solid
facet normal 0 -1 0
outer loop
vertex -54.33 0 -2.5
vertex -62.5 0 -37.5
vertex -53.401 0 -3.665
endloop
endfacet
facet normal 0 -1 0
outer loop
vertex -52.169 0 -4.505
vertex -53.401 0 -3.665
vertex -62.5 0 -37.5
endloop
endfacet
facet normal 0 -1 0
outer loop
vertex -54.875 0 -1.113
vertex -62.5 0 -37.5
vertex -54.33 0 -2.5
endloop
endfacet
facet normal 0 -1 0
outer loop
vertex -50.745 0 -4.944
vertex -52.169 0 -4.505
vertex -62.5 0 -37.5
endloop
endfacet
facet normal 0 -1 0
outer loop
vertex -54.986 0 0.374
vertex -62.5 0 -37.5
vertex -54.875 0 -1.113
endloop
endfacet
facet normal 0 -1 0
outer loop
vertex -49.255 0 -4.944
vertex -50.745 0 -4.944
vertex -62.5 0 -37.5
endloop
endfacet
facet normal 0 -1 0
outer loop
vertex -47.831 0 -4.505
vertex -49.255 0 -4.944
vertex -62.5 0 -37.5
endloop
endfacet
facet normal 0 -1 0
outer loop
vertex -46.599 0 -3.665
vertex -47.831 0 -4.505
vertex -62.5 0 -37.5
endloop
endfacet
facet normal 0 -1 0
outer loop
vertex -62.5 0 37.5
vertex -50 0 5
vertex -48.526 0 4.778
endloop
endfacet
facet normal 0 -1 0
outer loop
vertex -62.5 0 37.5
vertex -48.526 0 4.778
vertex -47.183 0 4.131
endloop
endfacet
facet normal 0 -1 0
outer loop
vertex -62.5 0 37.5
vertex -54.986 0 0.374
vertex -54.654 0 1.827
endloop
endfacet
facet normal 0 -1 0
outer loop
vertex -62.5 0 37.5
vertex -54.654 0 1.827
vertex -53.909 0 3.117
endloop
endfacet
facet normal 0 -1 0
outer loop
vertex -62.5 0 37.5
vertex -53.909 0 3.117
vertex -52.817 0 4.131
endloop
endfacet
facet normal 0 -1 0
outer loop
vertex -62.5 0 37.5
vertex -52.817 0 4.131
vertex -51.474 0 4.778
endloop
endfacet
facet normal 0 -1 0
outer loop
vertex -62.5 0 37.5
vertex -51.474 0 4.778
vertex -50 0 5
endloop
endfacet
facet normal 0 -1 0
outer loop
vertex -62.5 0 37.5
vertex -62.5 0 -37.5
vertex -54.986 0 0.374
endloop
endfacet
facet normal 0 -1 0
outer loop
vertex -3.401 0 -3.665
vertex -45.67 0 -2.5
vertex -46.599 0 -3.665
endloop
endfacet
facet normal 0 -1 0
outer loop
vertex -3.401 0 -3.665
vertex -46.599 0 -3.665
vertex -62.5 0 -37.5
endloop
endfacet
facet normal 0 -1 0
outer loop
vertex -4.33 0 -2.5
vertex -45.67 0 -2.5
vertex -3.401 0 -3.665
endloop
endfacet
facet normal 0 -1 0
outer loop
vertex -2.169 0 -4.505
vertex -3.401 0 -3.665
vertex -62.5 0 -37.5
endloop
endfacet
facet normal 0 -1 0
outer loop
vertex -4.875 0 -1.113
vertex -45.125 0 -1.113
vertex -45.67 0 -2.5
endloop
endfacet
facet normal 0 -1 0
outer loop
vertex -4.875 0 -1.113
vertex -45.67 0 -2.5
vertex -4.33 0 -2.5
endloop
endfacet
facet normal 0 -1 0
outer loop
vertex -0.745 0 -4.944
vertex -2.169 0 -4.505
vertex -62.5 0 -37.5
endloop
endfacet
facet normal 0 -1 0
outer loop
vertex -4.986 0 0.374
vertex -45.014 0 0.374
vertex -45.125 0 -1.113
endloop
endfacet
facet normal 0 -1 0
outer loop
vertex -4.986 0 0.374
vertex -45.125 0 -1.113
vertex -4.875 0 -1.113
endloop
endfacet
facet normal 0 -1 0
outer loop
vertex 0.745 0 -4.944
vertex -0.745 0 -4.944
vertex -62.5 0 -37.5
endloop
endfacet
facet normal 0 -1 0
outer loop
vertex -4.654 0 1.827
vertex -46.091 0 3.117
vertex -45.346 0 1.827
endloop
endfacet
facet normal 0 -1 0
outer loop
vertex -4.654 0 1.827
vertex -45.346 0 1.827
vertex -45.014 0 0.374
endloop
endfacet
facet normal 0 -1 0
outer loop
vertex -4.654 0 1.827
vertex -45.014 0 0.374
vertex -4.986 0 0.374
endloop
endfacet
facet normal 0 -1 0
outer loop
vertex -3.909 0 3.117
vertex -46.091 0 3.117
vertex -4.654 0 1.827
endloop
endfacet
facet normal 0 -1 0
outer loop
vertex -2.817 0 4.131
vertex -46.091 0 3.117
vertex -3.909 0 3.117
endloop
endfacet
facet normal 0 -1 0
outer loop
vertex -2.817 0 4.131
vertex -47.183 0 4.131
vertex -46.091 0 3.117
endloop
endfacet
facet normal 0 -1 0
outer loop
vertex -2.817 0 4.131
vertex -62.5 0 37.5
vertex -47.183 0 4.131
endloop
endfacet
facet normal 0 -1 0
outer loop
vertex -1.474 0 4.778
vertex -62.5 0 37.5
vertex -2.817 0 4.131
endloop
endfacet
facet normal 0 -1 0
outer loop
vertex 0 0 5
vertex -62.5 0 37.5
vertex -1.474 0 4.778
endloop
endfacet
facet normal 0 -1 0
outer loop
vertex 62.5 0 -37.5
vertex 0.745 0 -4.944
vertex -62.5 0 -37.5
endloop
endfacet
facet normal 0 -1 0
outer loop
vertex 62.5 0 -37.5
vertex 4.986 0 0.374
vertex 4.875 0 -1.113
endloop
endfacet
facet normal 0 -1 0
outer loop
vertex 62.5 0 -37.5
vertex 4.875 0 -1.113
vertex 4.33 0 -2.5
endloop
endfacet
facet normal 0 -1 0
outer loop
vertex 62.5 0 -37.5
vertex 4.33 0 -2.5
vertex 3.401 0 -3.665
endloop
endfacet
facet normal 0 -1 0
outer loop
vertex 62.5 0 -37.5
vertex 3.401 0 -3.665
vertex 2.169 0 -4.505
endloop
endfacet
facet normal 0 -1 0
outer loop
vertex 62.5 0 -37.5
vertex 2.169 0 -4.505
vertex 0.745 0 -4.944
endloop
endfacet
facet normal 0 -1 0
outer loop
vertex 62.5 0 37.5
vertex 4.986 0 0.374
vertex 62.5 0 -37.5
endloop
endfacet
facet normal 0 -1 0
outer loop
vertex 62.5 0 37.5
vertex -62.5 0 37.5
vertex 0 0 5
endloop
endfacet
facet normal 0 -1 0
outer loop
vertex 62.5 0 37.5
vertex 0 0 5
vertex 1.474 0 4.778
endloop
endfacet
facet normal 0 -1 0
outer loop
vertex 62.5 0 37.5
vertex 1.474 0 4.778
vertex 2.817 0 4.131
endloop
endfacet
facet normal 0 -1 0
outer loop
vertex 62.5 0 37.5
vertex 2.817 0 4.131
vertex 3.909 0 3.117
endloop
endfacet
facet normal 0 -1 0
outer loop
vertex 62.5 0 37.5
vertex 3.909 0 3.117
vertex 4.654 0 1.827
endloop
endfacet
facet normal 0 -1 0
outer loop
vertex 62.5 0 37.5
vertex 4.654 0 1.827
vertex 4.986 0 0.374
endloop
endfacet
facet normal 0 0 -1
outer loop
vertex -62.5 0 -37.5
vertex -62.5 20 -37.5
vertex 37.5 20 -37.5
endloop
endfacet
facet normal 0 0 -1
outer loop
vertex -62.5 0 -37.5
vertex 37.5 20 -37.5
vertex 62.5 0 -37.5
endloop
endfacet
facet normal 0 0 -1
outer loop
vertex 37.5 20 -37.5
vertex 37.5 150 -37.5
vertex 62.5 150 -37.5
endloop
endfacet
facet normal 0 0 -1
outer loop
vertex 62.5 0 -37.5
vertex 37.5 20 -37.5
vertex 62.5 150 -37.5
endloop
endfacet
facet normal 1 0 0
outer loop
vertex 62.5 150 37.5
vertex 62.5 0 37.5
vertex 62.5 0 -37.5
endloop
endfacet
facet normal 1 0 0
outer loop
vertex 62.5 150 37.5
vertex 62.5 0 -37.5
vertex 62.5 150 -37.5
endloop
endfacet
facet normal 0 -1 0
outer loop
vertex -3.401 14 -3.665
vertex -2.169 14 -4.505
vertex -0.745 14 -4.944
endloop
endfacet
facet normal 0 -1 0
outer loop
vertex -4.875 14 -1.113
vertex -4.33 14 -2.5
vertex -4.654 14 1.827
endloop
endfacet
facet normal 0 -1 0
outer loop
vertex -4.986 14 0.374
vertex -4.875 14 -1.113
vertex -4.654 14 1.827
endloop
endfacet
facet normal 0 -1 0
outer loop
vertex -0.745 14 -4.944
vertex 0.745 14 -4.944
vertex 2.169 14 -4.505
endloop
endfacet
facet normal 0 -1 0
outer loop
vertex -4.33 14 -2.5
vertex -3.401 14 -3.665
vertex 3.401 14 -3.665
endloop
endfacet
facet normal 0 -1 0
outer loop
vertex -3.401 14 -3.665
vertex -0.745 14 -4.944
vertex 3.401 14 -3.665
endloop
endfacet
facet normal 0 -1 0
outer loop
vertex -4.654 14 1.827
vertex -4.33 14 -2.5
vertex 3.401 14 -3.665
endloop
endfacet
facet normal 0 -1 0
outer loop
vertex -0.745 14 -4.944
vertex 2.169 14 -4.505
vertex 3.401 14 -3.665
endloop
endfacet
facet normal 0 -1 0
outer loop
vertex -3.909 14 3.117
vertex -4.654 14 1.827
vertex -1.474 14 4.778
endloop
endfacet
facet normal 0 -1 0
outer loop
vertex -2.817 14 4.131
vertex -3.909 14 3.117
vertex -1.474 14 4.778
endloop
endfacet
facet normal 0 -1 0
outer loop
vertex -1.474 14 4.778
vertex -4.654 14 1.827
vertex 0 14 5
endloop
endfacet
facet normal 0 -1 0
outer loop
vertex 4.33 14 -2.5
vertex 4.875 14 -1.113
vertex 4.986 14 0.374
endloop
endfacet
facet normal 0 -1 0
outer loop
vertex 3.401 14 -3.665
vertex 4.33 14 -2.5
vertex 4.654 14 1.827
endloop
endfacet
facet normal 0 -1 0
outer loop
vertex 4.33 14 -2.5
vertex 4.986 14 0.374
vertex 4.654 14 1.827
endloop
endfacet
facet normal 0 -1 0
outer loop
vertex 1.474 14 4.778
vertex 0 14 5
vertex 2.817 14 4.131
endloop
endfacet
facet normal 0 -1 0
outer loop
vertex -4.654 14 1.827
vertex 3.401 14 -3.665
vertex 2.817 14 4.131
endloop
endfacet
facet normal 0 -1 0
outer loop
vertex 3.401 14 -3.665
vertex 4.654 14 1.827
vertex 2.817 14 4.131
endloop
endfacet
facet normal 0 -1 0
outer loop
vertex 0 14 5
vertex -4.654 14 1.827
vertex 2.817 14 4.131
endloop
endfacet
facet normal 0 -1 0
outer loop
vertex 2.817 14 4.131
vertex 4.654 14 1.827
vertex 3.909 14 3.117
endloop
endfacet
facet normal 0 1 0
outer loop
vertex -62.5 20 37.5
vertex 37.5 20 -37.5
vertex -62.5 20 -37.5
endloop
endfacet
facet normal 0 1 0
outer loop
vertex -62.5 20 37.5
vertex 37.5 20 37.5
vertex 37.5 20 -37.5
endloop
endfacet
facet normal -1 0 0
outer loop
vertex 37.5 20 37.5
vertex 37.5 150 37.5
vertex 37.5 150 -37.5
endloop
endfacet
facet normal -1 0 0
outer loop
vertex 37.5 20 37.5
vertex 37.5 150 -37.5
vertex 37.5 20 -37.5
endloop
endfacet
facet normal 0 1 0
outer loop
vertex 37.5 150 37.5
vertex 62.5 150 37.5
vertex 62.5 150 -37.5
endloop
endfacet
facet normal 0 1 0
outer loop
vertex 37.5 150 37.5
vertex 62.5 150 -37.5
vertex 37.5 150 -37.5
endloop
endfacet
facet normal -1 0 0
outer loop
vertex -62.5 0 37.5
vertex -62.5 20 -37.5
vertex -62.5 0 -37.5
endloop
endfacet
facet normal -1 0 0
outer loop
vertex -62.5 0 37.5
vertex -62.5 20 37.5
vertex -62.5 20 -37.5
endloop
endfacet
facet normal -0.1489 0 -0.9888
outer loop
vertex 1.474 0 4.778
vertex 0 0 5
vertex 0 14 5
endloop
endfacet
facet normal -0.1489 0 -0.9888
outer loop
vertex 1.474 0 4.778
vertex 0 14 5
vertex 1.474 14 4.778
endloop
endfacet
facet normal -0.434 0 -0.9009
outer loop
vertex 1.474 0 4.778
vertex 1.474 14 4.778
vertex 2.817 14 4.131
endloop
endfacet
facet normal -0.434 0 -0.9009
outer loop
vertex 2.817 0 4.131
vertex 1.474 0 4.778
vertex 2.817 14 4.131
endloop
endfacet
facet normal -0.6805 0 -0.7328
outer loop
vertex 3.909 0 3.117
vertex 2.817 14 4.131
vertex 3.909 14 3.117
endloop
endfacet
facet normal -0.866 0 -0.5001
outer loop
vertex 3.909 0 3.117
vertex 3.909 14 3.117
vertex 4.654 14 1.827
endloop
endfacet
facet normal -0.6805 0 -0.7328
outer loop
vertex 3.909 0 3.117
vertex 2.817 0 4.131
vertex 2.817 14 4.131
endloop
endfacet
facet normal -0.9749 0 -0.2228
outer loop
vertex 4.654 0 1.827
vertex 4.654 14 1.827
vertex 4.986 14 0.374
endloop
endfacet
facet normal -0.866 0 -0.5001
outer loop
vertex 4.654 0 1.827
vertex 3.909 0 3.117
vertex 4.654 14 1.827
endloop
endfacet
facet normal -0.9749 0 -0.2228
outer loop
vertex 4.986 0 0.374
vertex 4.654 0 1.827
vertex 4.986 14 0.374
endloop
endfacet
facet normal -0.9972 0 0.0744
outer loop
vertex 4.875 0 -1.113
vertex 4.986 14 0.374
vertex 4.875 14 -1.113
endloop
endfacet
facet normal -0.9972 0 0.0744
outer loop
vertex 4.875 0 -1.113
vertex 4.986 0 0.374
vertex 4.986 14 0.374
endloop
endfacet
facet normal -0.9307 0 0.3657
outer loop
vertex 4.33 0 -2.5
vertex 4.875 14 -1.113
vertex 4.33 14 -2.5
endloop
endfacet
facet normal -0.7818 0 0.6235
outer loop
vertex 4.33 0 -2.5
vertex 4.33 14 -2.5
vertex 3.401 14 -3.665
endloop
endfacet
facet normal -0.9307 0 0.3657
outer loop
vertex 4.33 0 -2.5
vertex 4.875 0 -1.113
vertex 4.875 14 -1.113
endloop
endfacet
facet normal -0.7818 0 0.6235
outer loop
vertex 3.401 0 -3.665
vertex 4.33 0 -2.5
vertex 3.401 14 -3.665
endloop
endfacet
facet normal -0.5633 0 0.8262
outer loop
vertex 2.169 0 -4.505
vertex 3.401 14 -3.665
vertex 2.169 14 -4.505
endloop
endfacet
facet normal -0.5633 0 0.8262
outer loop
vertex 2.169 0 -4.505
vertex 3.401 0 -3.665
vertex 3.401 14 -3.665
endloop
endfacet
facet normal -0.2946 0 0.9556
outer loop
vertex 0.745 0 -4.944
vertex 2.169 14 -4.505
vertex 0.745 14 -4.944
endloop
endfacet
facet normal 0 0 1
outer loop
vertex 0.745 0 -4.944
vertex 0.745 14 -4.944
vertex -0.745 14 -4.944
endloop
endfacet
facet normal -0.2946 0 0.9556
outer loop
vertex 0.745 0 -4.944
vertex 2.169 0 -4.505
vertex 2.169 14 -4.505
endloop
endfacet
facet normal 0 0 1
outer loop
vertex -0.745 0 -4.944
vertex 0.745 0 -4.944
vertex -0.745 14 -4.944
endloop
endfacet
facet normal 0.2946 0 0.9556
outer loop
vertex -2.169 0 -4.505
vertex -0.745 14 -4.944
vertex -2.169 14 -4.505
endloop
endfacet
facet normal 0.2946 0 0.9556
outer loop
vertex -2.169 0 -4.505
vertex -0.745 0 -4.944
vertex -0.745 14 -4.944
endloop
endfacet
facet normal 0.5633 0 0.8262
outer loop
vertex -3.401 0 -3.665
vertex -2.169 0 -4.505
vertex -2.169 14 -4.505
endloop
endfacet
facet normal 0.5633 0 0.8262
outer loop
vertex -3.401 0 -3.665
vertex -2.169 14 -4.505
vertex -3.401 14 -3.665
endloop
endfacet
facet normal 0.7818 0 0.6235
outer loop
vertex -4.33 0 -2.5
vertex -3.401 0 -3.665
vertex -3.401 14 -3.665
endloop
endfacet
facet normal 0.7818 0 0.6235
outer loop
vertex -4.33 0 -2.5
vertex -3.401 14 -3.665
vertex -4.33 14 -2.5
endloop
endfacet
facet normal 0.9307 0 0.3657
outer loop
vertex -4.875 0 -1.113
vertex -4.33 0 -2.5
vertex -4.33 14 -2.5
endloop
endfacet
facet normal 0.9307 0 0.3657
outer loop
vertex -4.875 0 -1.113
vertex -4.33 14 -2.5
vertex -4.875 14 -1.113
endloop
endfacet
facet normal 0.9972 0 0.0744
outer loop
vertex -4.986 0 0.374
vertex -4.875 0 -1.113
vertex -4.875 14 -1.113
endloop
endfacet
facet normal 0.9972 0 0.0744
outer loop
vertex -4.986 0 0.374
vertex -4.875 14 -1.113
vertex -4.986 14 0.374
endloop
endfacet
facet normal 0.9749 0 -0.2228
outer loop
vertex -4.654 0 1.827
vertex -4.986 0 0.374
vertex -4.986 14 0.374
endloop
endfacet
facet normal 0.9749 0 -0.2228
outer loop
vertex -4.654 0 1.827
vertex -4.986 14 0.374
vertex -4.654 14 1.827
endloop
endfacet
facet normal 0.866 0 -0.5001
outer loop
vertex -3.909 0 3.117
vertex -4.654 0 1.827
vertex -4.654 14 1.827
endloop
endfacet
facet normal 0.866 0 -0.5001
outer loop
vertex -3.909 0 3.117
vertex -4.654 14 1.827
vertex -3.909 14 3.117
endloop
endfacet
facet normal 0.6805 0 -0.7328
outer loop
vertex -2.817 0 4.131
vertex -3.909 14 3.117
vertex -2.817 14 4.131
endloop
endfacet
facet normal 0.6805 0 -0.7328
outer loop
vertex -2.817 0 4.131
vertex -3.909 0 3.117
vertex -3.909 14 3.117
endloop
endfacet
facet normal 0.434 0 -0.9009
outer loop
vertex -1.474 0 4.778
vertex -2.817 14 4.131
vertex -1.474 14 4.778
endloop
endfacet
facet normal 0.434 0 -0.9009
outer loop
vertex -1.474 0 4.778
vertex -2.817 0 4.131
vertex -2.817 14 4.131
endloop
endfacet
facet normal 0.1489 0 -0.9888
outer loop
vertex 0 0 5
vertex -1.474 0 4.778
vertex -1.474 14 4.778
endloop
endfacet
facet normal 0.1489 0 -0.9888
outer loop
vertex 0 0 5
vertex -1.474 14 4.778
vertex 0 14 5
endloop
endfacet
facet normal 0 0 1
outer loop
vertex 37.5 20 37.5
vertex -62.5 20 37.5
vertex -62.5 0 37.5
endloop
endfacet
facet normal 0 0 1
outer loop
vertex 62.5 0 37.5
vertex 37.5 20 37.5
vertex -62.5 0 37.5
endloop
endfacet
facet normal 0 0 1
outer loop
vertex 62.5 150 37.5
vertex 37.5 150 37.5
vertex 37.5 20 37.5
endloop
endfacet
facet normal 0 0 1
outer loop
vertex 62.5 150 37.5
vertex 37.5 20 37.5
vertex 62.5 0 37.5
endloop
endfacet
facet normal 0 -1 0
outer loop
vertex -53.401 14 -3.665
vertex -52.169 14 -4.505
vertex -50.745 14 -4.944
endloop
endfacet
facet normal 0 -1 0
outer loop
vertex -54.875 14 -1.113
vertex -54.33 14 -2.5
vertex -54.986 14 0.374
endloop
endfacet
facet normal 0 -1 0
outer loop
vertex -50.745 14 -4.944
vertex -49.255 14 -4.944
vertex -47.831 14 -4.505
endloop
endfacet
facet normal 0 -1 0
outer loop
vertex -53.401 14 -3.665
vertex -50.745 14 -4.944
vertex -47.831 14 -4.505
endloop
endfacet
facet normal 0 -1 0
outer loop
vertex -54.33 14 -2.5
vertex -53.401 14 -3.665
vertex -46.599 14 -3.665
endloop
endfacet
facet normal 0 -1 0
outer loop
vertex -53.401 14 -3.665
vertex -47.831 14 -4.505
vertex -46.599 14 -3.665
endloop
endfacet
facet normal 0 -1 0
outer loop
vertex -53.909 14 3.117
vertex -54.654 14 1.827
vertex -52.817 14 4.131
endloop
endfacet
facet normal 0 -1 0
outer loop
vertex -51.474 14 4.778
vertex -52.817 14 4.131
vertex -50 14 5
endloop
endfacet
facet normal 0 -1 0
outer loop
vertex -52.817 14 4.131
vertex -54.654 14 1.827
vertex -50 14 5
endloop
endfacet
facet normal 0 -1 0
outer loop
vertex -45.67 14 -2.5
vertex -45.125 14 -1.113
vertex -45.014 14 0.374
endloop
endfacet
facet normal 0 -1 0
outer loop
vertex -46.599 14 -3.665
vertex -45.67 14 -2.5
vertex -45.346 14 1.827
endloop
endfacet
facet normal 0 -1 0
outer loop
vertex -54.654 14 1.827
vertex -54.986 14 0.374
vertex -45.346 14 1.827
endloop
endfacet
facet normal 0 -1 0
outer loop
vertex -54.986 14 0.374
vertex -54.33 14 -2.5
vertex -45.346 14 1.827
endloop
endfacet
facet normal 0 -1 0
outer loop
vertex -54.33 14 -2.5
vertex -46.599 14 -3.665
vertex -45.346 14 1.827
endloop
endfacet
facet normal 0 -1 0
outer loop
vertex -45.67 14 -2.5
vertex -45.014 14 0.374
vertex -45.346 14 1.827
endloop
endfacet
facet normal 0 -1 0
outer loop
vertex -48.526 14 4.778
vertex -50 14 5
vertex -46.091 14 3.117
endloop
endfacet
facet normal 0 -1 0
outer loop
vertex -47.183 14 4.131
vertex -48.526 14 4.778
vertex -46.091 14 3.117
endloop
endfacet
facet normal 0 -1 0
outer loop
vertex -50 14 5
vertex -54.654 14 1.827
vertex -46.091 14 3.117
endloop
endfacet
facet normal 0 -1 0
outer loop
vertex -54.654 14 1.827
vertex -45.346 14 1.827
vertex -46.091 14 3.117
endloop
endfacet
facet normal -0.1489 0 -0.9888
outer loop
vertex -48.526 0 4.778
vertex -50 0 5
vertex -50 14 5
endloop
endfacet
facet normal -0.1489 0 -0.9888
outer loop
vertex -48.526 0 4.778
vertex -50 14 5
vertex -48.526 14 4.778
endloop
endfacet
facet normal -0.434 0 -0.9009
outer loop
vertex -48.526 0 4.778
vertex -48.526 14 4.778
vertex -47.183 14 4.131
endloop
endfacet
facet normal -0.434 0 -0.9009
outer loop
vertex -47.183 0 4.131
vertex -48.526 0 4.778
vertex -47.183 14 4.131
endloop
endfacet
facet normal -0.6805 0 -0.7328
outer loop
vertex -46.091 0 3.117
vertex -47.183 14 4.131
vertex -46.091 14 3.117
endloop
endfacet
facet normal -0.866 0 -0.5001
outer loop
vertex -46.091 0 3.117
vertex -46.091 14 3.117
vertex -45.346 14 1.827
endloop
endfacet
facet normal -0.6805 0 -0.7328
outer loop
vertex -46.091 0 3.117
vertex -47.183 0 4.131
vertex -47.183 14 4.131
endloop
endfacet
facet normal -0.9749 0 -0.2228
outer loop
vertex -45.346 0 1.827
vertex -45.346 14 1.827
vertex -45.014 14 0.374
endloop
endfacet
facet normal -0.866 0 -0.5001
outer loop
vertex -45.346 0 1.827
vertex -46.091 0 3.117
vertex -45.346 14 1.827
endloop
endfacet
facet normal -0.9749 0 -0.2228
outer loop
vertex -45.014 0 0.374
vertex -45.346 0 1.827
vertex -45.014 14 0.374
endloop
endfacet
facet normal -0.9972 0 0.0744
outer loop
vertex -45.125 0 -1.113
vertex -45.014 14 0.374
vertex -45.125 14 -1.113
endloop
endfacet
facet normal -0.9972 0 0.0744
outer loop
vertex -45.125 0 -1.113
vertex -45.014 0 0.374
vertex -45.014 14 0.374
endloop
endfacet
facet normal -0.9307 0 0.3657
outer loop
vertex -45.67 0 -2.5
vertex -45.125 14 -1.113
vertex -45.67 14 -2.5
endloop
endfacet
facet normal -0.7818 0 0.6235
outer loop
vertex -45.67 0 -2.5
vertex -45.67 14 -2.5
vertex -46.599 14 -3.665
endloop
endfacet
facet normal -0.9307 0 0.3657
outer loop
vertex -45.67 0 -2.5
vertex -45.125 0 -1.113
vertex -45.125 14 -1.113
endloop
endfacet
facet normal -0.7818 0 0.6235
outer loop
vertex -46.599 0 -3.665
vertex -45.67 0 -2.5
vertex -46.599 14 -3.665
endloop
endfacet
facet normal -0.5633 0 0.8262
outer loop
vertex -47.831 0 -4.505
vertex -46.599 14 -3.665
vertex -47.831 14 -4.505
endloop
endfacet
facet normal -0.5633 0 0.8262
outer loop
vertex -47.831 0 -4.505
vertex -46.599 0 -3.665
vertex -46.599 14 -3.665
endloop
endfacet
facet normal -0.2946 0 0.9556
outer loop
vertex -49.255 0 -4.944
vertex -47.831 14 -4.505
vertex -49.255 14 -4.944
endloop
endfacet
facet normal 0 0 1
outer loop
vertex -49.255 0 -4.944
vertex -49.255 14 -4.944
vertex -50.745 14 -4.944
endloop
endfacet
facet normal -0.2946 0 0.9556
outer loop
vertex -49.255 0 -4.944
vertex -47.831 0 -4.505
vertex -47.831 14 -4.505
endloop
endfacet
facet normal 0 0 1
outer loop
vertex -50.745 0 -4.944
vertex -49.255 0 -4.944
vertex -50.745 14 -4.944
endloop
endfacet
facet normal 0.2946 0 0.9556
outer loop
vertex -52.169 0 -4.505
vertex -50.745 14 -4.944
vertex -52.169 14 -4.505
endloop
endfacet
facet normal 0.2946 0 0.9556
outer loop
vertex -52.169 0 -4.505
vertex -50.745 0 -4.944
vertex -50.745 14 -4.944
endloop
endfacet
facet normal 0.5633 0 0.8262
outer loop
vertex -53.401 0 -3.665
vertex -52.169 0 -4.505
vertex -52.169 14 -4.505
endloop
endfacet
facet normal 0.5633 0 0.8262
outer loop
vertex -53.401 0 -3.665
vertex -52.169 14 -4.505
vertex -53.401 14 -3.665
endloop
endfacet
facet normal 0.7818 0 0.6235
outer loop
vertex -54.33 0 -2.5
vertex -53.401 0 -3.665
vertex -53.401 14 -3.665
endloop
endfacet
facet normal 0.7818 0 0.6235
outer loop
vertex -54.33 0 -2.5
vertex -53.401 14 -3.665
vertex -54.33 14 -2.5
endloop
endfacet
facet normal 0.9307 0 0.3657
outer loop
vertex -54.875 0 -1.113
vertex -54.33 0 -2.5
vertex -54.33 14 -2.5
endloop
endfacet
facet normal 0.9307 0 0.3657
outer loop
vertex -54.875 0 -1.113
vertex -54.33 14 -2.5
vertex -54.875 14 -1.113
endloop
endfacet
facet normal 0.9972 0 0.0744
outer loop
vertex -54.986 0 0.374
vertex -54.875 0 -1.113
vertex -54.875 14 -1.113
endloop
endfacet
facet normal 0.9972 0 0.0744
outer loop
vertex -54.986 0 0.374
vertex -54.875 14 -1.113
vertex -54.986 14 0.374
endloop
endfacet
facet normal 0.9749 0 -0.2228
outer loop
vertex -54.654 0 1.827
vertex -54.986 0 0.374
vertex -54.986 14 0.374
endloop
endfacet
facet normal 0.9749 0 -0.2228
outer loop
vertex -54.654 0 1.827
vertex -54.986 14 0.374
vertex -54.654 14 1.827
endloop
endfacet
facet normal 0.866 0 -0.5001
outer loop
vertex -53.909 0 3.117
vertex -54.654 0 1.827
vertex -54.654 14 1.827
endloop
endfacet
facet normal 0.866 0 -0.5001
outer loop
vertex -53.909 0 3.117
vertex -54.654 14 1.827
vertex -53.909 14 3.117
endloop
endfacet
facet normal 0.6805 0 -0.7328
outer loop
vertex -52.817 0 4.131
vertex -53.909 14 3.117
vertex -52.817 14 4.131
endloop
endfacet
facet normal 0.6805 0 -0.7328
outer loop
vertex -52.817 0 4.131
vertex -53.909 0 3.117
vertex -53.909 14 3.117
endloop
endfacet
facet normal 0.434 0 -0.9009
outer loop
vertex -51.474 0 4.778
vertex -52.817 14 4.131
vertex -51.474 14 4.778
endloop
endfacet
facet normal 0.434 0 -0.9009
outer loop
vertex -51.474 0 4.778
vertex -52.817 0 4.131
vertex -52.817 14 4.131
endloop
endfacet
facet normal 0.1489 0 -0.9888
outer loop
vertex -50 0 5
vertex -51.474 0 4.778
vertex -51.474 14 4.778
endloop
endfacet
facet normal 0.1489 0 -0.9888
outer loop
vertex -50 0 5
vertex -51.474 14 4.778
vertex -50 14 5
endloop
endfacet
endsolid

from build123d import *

# Parameters (mm, degrees)
ANGULO_L_DEPTH             = 37.5
CROQUIS_AGUJEROS_MONTAJE_R = 5
AGUJERO_INSERTO_M6_DEPTH   = 14


with BuildPart() as part:
    # Croquis_perfil_L → Angulo_L (new, symmetric)
    with BuildSketch(Plane.XY):
        Polygon((-62.5, 0), (62.5, 0), (62.5, 150), (37.5, 150), (37.5, 20), (-62.5, 20), align=None)
    extrude(amount=ANGULO_L_DEPTH, both=True)

    # Croquis_agujeros_montaje → Agujero_inserto_M6 (cut)
    with BuildSketch(Plane(origin=(0, 0, 0), x_dir=(1, 0, 0), z_dir=(0, 1, 0))):
        with Locations(Location((-50, 0, 0), (0, 0, 270))):
            Circle(CROQUIS_AGUJEROS_MONTAJE_R)
        with Locations(Location((0, 0, 0), (0, 0, 270))):
            Circle(CROQUIS_AGUJEROS_MONTAJE_R)
    extrude(amount=AGUJERO_INSERTO_M6_DEPTH, mode=Mode.SUBTRACT)


solid = part.part
